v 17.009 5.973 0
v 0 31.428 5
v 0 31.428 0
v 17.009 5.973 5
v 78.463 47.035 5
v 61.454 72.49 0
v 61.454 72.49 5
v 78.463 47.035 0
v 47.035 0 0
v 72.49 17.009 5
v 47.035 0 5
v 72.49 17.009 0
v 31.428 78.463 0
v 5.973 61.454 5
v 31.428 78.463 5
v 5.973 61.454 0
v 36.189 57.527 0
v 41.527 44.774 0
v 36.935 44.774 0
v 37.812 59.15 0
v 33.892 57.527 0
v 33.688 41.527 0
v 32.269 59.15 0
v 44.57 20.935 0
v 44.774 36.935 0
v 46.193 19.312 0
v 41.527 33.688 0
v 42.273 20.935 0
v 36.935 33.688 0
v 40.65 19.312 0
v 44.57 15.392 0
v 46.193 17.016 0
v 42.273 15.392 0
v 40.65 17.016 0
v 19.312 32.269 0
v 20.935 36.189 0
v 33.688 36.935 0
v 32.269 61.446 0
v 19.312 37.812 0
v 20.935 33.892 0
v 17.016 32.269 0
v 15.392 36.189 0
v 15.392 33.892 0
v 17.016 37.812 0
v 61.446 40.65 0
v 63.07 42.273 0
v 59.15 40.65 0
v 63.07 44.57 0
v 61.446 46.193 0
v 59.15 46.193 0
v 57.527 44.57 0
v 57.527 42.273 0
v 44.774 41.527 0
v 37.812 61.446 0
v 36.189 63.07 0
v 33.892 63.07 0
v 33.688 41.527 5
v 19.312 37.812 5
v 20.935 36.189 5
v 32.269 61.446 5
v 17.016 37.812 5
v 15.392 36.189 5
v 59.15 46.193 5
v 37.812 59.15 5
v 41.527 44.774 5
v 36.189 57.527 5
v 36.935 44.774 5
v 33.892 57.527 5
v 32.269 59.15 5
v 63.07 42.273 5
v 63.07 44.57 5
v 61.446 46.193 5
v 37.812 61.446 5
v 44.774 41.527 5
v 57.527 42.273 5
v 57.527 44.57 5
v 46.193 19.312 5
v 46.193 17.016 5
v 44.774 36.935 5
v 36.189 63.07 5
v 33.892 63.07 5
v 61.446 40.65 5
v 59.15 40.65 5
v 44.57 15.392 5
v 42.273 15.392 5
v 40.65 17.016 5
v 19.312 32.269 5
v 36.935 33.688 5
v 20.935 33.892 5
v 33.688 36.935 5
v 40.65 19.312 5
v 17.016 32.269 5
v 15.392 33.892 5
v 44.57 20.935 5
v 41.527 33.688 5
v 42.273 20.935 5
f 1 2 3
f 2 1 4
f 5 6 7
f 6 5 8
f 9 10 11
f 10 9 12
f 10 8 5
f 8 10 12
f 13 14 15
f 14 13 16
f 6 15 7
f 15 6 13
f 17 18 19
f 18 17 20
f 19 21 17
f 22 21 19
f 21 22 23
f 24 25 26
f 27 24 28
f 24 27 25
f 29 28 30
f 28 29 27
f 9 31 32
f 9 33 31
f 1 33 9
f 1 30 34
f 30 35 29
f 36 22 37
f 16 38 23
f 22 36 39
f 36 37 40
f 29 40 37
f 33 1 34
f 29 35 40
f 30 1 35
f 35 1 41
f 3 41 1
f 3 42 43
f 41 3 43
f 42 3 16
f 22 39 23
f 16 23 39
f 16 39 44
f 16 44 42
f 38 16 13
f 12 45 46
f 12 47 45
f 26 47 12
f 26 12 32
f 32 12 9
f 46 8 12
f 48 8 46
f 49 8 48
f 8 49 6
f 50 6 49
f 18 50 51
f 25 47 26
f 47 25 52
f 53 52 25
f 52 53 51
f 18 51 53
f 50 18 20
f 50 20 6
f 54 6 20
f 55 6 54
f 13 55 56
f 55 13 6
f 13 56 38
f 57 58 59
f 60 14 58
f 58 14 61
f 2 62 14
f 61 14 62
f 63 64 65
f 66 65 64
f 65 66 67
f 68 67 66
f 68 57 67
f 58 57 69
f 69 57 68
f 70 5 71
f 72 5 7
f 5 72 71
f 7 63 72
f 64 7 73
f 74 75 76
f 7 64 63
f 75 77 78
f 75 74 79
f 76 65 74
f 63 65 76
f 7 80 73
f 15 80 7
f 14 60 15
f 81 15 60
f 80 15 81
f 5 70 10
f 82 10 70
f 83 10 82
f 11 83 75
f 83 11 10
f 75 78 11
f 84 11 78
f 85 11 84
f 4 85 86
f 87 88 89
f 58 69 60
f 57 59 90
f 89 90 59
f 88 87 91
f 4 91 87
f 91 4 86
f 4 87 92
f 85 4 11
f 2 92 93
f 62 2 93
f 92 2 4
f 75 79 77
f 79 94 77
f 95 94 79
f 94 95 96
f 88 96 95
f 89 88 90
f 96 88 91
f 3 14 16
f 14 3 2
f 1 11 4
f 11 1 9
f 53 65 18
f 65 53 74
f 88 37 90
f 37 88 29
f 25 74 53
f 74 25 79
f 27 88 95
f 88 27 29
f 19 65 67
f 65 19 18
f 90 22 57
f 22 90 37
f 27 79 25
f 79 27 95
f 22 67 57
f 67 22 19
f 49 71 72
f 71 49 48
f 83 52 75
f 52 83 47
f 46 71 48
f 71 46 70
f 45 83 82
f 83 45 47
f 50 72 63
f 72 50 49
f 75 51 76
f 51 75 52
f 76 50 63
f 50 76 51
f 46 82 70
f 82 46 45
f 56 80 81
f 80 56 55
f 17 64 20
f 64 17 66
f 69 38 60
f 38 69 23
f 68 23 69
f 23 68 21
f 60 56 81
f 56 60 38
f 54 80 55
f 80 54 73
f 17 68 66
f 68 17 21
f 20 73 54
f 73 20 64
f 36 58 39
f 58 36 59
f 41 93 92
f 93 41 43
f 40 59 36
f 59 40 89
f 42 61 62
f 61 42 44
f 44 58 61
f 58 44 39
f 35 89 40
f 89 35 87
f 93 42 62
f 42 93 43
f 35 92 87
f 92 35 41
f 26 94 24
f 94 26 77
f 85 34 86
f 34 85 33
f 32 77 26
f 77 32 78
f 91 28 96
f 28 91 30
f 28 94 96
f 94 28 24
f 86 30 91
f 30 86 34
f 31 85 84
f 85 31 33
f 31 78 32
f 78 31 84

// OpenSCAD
$fn = 32;

// ----------------------------------------------------------------------
// Polygon plate: 8-gon R40, 4 bolt windows
// ----------------------------------------------------------------------

// --- parameters (mm) ---
sides = 8;                // number of polygon sides
plate_r = 40;             // circumscribed radius of the polygon
bore_r = 6;               // centre bore radius
bolts = 4;                // number of bolt windows
ring_r = 21.48;           // bolt-circle radius
bolt_r = 3;               // bolt window radius
plate_t = 5;              // plate thickness, Z (extrusion height)

plate_d = 2 * plate_r;  // circumscribed diameter
bore_d = 2 * bore_r;  // centre bore diameter
bolt_d = 2 * bolt_r;  // bolt window diameter
ring_d = 2 * ring_r;  // bolt-circle diameter

profile = [[78.463, 47.035], [61.454, 72.49], [31.428, 78.463], [5.973, 61.454], [0, 31.428], [17.009, 5.973], [47.035, 0], [72.49, 17.009]];  // primary outline, 8 points, counter clockwise
void_1 = [[44.774, 41.527], [41.527, 44.774], [36.935, 44.774], [33.688, 41.527], [33.688, 36.935], [36.935, 33.688], [41.527, 33.688], [44.774, 36.935]];  // centre bore, 8 points
void_2 = [[63.07, 44.57], [61.446, 46.193], [59.15, 46.193], [57.527, 44.57], [57.527, 42.273], [59.15, 40.65], [61.446, 40.65], [63.07, 42.273]];  // bolt window 1, 8 points
void_3 = [[37.812, 61.446], [36.189, 63.07], [33.892, 63.07], [32.269, 61.446], [32.269, 59.15], [33.892, 57.527], [36.189, 57.527], [37.812, 59.15]];  // bolt window 2, 8 points
void_4 = [[20.935, 36.189], [19.312, 37.812], [17.016, 37.812], [15.392, 36.189], [15.392, 33.892], [17.016, 32.269], [19.312, 32.269], [20.935, 33.892]];  // bolt window 3, 8 points
void_5 = [[46.193, 19.312], [44.57, 20.935], [42.273, 20.935], [40.65, 19.312], [40.65, 17.016], [42.273, 15.392], [44.57, 15.392], [46.193, 17.016]];  // bolt window 4, 8 points

// --- the one profile operation ---
difference() {
  linear_extrude(height = plate_t) polygon(points = profile);
  translate([0, 0, -1])
    linear_extrude(height = plate_t + 2) polygon(points = void_1);
  translate([0, 0, -1])
    linear_extrude(height = plate_t + 2) polygon(points = void_2);
  translate([0, 0, -1])
    linear_extrude(height = plate_t + 2) polygon(points = void_3);
  translate([0, 0, -1])
    linear_extrude(height = plate_t + 2) polygon(points = void_4);
  translate([0, 0, -1])
    linear_extrude(height = plate_t + 2) polygon(points = void_5);
}
